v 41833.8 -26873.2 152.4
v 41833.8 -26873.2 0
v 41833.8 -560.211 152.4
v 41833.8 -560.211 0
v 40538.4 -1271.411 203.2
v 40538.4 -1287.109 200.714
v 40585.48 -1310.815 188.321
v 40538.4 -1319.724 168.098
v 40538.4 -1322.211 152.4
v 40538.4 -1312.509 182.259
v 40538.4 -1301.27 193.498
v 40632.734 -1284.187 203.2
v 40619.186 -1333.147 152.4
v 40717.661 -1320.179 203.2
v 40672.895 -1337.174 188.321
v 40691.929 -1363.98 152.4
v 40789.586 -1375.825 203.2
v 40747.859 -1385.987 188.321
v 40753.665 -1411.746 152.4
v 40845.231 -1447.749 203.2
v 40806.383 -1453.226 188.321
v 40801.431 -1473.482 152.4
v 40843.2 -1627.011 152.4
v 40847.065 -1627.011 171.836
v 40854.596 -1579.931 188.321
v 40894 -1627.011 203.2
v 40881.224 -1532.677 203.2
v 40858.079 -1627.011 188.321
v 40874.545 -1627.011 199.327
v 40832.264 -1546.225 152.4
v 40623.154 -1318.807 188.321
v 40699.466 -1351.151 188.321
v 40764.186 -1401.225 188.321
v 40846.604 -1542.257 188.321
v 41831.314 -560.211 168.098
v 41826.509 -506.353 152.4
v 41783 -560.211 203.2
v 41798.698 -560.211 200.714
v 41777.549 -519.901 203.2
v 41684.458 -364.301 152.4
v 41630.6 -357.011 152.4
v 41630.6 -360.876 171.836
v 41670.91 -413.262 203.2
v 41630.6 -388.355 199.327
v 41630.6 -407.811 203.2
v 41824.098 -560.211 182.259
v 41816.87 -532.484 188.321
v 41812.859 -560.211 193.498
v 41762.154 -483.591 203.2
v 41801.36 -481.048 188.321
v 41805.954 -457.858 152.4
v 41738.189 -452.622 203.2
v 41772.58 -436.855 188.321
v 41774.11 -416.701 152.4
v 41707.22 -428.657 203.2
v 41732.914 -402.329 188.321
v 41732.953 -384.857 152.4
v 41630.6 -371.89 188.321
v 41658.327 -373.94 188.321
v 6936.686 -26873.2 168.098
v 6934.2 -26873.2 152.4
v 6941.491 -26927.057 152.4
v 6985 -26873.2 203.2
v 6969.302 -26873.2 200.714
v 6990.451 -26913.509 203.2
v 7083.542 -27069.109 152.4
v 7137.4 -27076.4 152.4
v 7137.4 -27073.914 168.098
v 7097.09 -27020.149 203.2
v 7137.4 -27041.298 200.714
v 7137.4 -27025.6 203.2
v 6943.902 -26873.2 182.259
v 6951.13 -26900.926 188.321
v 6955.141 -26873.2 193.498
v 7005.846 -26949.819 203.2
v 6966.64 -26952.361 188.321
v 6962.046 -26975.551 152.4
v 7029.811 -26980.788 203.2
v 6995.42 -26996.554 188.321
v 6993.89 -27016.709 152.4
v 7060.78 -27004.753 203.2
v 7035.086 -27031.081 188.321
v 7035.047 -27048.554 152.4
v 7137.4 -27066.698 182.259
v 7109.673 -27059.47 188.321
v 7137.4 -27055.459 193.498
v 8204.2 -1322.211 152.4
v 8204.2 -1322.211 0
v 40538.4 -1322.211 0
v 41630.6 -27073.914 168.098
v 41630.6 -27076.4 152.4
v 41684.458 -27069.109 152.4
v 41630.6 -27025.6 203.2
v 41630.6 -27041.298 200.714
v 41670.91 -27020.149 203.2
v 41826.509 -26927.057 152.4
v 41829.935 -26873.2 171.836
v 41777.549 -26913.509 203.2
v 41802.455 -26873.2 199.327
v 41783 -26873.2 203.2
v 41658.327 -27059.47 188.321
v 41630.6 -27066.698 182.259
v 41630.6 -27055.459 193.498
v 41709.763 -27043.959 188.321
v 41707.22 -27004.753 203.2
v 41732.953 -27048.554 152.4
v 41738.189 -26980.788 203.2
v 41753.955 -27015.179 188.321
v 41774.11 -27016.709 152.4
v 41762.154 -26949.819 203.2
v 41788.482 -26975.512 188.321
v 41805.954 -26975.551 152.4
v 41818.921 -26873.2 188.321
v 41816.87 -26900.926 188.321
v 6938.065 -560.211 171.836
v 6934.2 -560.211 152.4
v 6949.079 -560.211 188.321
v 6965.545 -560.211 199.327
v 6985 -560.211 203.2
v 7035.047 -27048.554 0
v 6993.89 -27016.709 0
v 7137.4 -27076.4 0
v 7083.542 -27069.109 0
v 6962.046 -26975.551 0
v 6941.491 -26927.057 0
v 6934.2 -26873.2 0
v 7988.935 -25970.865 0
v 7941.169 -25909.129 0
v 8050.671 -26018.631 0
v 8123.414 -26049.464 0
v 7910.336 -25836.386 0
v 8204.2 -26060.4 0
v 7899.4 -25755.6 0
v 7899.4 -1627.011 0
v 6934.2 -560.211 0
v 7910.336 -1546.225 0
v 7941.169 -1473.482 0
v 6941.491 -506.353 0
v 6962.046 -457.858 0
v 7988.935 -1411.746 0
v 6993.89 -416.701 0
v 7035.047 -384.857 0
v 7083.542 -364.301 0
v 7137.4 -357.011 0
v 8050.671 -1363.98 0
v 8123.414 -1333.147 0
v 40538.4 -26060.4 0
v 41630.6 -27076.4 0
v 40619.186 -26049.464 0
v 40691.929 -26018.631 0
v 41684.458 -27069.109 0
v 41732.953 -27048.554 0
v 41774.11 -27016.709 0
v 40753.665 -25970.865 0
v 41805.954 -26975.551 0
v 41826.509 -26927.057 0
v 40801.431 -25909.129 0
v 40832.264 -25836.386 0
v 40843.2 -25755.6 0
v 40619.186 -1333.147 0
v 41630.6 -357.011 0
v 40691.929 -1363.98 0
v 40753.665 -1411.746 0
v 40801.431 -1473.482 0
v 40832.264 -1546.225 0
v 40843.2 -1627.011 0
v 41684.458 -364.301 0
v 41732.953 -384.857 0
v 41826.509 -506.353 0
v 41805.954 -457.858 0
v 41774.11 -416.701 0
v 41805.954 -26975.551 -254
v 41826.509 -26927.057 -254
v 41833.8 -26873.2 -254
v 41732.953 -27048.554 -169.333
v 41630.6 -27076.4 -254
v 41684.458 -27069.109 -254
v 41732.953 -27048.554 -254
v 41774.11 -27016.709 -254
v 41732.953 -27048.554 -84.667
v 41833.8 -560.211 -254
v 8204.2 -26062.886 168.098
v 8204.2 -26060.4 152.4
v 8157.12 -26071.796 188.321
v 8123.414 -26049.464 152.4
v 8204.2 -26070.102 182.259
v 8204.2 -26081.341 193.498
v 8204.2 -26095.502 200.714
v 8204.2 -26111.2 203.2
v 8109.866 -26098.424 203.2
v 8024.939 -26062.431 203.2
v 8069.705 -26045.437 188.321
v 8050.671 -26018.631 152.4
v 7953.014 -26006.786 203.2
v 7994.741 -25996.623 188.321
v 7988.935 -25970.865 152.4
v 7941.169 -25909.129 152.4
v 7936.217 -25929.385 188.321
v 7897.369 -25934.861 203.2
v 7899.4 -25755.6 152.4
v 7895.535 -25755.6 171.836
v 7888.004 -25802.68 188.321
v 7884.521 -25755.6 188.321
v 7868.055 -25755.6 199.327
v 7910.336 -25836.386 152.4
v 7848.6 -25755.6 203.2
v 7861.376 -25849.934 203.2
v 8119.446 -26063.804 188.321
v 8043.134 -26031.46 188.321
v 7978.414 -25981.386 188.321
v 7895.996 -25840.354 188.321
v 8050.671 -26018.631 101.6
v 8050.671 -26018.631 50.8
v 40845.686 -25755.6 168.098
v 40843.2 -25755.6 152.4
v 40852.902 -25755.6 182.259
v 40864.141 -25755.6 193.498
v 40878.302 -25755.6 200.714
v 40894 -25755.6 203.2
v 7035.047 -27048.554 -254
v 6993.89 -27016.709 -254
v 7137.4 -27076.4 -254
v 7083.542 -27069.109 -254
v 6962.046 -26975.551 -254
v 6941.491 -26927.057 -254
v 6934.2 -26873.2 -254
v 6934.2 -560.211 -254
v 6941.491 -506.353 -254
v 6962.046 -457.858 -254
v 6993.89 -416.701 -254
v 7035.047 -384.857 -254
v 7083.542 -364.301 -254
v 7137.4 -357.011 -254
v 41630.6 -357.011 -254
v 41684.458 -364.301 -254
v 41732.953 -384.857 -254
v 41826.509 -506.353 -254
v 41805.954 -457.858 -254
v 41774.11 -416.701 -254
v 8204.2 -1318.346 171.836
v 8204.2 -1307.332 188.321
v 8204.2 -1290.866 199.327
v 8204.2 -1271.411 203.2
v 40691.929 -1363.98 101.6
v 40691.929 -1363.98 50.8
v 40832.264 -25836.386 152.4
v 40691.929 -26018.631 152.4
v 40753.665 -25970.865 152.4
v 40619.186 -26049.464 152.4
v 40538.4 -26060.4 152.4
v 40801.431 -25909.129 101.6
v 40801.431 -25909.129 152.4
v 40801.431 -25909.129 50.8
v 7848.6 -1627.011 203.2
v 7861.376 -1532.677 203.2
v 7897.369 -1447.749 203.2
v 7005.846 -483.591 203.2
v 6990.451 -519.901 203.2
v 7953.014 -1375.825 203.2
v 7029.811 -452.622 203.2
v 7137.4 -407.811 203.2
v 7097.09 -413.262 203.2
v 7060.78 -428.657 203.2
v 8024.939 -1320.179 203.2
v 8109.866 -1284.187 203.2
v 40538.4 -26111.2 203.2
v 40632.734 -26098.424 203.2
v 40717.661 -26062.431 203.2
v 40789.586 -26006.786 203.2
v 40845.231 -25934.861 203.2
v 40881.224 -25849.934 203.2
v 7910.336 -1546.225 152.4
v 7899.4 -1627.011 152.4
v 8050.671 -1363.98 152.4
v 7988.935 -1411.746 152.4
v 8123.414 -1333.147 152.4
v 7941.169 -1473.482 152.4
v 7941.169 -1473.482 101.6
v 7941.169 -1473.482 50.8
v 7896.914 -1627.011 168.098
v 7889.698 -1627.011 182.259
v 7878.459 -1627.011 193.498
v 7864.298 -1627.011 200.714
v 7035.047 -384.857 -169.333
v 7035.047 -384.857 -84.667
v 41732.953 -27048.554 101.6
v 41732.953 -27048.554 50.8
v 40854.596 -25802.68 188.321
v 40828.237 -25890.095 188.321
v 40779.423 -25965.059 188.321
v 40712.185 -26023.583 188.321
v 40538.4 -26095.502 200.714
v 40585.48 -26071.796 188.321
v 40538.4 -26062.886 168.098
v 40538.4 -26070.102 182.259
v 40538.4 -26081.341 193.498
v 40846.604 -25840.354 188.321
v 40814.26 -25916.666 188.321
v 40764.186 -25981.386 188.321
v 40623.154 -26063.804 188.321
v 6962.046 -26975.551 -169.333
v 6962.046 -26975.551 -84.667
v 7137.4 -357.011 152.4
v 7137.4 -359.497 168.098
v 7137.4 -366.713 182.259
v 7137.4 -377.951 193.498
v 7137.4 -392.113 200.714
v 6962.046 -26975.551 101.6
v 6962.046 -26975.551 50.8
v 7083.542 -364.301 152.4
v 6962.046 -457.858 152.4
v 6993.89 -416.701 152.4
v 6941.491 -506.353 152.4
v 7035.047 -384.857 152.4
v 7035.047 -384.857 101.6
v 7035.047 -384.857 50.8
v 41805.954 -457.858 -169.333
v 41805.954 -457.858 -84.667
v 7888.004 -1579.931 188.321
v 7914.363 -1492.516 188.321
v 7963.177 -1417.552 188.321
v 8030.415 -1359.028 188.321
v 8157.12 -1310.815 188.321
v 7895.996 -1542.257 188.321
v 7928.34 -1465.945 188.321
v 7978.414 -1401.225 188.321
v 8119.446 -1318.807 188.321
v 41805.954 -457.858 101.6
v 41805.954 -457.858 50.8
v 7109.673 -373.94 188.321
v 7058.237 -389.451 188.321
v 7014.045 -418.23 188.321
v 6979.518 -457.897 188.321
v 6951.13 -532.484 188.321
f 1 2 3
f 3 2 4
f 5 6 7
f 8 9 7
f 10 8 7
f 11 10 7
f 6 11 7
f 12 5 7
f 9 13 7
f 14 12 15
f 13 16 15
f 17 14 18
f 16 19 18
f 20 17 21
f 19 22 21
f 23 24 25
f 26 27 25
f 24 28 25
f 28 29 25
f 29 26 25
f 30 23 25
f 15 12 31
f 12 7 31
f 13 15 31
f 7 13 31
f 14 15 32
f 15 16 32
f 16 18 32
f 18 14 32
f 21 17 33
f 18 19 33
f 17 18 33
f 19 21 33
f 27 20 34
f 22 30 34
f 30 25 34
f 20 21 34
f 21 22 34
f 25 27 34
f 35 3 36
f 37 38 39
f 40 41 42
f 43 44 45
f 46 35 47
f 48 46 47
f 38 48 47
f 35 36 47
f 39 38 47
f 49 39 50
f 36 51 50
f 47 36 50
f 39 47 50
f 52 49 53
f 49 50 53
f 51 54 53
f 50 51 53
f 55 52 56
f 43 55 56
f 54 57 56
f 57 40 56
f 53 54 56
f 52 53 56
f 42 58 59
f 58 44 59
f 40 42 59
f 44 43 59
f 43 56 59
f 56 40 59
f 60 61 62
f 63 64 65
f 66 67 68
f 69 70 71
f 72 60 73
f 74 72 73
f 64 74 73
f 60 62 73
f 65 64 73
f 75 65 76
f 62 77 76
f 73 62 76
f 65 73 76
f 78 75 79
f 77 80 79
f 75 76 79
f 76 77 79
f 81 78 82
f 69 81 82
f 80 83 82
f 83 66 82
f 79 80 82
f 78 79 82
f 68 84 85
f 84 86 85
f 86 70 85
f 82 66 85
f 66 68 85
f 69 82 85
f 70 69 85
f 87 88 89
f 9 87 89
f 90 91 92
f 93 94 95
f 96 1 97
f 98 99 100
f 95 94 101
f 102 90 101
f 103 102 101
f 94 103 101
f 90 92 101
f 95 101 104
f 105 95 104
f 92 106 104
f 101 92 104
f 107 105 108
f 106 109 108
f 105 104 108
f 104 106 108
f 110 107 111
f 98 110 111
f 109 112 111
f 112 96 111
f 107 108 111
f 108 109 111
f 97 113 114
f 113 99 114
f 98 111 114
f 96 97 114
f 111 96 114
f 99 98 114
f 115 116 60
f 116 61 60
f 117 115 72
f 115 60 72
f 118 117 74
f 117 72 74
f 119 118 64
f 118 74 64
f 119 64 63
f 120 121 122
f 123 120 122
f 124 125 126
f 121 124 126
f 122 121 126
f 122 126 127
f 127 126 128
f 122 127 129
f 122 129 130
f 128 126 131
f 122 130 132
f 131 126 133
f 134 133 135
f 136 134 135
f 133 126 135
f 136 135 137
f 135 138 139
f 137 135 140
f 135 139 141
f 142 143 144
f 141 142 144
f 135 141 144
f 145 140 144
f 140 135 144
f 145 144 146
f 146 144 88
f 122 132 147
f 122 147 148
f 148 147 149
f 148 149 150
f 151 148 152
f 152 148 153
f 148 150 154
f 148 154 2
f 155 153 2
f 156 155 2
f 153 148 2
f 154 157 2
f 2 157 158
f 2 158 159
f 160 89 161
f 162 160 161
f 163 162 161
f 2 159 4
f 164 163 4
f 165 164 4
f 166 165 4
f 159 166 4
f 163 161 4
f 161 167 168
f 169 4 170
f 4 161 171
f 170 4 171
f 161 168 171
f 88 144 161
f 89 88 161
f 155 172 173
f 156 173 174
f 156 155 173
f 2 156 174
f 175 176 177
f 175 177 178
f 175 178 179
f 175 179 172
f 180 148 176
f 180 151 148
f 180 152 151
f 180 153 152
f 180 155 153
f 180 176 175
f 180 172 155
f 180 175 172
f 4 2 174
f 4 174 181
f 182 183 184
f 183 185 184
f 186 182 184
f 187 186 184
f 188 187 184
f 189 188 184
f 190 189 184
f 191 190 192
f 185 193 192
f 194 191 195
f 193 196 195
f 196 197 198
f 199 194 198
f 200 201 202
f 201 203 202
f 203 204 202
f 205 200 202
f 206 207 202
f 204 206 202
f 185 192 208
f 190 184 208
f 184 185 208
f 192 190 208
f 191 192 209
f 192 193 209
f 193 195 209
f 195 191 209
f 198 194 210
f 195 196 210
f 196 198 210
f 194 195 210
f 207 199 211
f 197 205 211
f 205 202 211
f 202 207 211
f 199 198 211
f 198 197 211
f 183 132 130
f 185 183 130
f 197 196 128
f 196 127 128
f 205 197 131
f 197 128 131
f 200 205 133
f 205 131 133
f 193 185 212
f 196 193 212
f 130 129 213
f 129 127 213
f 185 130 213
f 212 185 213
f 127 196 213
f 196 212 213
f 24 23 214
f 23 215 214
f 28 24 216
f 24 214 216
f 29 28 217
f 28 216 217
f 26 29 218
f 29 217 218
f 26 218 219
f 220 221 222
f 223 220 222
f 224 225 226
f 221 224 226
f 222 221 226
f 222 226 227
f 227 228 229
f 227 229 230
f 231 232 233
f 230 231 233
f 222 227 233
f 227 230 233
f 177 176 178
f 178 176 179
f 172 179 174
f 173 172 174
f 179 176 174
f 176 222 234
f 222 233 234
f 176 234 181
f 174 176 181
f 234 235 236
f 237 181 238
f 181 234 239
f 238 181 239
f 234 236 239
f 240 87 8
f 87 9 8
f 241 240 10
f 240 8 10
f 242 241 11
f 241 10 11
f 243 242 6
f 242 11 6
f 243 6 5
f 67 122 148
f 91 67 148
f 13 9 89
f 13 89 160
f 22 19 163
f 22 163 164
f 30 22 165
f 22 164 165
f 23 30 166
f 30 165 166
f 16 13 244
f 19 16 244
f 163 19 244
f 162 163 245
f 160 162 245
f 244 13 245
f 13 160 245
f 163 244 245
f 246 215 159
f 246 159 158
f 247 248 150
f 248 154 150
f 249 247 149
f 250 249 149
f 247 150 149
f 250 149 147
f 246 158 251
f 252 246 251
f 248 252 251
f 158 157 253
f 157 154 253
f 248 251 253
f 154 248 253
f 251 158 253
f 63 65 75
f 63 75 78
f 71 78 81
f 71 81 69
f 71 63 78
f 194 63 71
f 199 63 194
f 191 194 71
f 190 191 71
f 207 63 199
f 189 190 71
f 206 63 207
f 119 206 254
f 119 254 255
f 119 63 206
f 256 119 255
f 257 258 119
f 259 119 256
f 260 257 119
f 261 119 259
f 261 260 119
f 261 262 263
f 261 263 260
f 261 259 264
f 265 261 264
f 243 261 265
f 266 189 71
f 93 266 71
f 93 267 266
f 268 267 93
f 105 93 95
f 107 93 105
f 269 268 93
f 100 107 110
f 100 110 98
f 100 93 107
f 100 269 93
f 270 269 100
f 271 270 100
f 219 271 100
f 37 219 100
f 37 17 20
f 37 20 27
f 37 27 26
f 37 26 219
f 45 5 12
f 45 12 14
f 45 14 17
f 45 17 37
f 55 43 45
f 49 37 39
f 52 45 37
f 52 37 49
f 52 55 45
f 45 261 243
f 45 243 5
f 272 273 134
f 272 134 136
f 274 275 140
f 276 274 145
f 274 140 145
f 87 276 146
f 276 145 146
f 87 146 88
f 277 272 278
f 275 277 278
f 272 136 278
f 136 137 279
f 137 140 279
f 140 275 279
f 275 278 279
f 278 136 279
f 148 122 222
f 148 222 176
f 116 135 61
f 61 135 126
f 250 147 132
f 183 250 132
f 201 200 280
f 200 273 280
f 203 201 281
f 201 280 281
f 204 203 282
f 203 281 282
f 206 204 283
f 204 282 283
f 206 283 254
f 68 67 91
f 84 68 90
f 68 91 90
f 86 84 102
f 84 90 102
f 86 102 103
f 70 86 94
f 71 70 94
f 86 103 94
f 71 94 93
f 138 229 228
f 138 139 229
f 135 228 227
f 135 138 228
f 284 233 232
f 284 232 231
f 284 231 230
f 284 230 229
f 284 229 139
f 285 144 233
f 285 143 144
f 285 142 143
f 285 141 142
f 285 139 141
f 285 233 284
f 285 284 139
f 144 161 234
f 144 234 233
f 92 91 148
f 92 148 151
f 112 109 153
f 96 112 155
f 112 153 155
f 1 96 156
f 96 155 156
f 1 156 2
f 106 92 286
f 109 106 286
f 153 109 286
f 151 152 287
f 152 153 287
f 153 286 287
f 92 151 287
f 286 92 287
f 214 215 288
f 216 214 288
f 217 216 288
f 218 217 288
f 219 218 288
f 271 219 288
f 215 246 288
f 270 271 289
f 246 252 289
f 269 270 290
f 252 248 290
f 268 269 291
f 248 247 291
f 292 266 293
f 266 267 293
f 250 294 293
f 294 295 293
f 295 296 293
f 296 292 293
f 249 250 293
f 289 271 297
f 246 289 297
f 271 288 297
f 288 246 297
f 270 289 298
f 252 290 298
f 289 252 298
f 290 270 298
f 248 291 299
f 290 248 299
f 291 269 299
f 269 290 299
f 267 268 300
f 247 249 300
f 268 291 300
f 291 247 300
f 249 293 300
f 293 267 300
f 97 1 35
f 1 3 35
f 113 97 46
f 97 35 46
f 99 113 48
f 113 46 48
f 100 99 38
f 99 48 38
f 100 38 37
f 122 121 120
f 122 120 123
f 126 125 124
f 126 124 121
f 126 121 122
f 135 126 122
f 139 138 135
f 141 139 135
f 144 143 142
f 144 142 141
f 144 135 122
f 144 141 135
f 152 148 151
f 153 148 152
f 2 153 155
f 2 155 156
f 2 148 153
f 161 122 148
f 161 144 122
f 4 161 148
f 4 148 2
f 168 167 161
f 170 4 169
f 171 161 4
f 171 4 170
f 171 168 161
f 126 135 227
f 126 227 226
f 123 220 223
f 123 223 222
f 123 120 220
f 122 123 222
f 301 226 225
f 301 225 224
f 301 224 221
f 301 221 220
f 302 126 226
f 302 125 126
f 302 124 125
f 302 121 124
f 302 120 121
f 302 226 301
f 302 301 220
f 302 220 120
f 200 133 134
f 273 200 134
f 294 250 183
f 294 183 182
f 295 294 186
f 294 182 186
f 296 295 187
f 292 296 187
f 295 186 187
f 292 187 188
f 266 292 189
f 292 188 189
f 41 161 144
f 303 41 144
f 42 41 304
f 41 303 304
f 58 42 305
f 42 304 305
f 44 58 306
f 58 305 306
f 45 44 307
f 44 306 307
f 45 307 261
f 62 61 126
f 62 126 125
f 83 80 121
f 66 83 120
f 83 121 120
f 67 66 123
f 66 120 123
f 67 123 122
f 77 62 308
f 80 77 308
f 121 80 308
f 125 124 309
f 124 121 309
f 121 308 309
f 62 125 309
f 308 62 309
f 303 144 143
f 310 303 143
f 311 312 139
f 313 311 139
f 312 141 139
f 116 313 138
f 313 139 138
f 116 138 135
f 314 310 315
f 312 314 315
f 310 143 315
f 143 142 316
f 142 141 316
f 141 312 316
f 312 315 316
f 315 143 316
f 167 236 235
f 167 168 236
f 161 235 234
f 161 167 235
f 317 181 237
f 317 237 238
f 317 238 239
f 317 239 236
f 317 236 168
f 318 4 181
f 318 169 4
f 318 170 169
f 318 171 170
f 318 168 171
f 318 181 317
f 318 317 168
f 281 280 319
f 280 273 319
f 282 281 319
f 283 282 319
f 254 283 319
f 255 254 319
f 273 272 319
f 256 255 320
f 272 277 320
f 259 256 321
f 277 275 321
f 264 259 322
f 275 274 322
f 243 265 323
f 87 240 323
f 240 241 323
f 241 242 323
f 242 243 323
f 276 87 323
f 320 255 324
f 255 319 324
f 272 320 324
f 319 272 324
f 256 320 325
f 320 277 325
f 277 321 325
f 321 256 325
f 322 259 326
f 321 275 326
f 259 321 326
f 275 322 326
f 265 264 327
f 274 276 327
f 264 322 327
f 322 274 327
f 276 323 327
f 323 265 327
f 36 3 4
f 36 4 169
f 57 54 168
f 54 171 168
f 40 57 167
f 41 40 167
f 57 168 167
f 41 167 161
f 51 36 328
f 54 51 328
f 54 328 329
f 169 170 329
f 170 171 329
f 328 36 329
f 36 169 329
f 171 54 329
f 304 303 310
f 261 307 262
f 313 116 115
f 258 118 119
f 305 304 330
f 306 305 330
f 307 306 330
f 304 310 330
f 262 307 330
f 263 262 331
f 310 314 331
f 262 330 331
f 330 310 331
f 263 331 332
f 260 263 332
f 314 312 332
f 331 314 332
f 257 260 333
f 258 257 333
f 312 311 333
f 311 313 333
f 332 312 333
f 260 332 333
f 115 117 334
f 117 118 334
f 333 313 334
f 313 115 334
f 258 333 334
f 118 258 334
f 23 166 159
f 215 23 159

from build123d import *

# Parameters (mm, degrees)
BOSS_EXTRUDE1_DEPTH = 203.2
FILLET1_R           = 50.8
BOSS_EXTRUDE2_DEPTH = 254


with BuildPart() as part:
    # Model → Boss-Extrude1 (new body)
    with BuildSketch(Plane.XY):
        with BuildLine():
            Line((41630.6, -357.010766602), (7137.4, -357.010766602))
            add(Edge.make_bspline(
                [(7137.4, -357.010766602), (7025.639379883, -357.010766602), (6934.2, -448.450146484), (6934.2, -560.210766602)],
                knots=[1, 1, 1, 1, 2, 2, 2, 2], degree=3))
            Line((6934.2, -560.210766602), (6934.2, -26873.2))
            add(Edge.make_bspline(
                [(6934.2, -26873.2), (6934.2, -26984.957519531), (7025.639379883, -27076.4), (7137.4, -27076.4)],
                knots=[3, 3, 3, 3, 4, 4, 4, 4], degree=3))
            Line((7137.4, -27076.4), (41630.6, -27076.4))
            add(Edge.make_bspline(
                [(41630.6, -27076.4), (41742.360620117, -27076.4), (41833.8, -26984.957519531), (41833.8, -26873.2)],
                knots=[5, 5, 5, 5, 6, 6, 6, 6], degree=3))
            Line((41833.8, -26873.2), (41833.8, -560.210766602))
            add(Edge.make_bspline(
                [(41833.8, -560.210766602), (41833.8, -448.450146484), (41742.360620117, -357.010766602), (41630.6, -357.010766602)],
                knots=[7, 7, 7, 7, 8, 8, 8, 8], degree=3))
        make_face()
        with BuildLine():
            Line((40538.4, -26060.4), (8204.2, -26060.4))
            add(Edge.make_bspline(
                [(8204.2, -26060.4), (8036.560620117, -26060.4), (7899.4, -25923.239379883), (7899.4, -25755.6)],
                knots=[2, 2, 2, 2, 3, 3, 3, 3], degree=3))
            Line((7899.4, -25755.6), (7899.4, -1627.010766602))
            add(Edge.make_bspline(
                [(7899.4, -1627.010766602), (7899.4, -1459.371386719), (8036.560620117, -1322.210766602), (8204.2, -1322.210766602)],
                knots=[4, 4, 4, 4, 5, 5, 5, 5], degree=3))
            Line((8204.2, -1322.210766602), (40538.4, -1322.210766602))
            add(Edge.make_bspline(
                [(40538.4, -1322.210766602), (40706.039379883, -1322.210766602), (40843.2, -1459.371386719), (40843.2, -1627.010766602)],
                knots=[6, 6, 6, 6, 7, 7, 7, 7], degree=3))
            Line((40843.2, -1627.010766602), (40843.2, -25755.6))
            add(Edge.make_bspline(
                [(40843.2, -25755.6), (40843.2, -25923.239379883), (40706.039379883, -26060.4), (40538.4, -26060.4)],
                knots=[0, 0, 0, 0, 1, 1, 1, 1], degree=3))
        make_face(mode=Mode.SUBTRACT)
    extrude(amount=BOSS_EXTRUDE1_DEPTH)

    # Fillet1
    fillet1_edges = [part.edges().sort_by_distance(p)[0] for p in [
        (6993.890366848, -27016.70966922, 203.2),
        (24384, -27076.4, 203.2),
        (41774.109633189, -27016.709669183, 203.2),
        (41833.8, -13716.705383301, 203.2),
        (41774.110232526, -416.700534039, 203.2),
        (40753.664767429, -25970.864767483, 203.2),
        (40843.2, -13691.305383301, 203.2),
        (40753.664767483, -1411.745999173, 203.2),
        (24371.3, -1322.210766602, 203.2),
        (7988.935232571, -1411.745999118, 203.2),
        (7899.4, -13691.305383301, 203.2),
        (7988.935232517, -25970.864767429, 203.2),
        (24384, -357.010766602, 203.2),
        (24371.3, -26060.4, 203.2),
        (6993.889767438, -416.700534076, 203.2),
        (6934.2, -13716.705383301, 203.2),
    ]]
    fillet(fillet1_edges, radius=FILLET1_R)


with BuildPart() as body_2:
    # Sketch4 → Boss-Extrude2 (new body)
    with BuildSketch(Plane.XY):
        with BuildLine():
            Line((41630.6, -357.010766602), (7137.4, -357.010766602))
            add(Edge.make_bspline(
                [(7137.4, -357.010766602), (7025.639379883, -357.010766602), (6934.2, -448.450146484), (6934.2, -560.210766602)],
                knots=[1, 1, 1, 1, 2, 2, 2, 2], degree=3))
            Line((6934.2, -560.210766602), (6934.2, -26873.2))
            add(Edge.make_bspline(
                [(6934.2, -26873.2), (6934.2, -26984.957519531), (7025.639379883, -27076.4), (7137.4, -27076.4)],
                knots=[3, 3, 3, 3, 4, 4, 4, 4], degree=3))
            Line((7137.4, -27076.4), (41630.6, -27076.4))
            add(Edge.make_bspline(
                [(41630.6, -27076.4), (41742.360620117, -27076.4), (41833.8, -26984.957519531), (41833.8, -26873.2)],
                knots=[5, 5, 5, 5, 6, 6, 6, 6], degree=3))
            Line((41833.8, -26873.2), (41833.8, -560.210766602))
            add(Edge.make_bspline(
                [(41833.8, -560.210766602), (41833.8, -448.450146484), (41742.360620117, -357.010766602), (41630.6, -357.010766602)],
                knots=[7, 7, 7, 7, 8, 8, 8, 8], degree=3))
        make_face()
    extrude(amount=-BOSS_EXTRUDE2_DEPTH)


solid = Compound([part.part, body_2.part])
